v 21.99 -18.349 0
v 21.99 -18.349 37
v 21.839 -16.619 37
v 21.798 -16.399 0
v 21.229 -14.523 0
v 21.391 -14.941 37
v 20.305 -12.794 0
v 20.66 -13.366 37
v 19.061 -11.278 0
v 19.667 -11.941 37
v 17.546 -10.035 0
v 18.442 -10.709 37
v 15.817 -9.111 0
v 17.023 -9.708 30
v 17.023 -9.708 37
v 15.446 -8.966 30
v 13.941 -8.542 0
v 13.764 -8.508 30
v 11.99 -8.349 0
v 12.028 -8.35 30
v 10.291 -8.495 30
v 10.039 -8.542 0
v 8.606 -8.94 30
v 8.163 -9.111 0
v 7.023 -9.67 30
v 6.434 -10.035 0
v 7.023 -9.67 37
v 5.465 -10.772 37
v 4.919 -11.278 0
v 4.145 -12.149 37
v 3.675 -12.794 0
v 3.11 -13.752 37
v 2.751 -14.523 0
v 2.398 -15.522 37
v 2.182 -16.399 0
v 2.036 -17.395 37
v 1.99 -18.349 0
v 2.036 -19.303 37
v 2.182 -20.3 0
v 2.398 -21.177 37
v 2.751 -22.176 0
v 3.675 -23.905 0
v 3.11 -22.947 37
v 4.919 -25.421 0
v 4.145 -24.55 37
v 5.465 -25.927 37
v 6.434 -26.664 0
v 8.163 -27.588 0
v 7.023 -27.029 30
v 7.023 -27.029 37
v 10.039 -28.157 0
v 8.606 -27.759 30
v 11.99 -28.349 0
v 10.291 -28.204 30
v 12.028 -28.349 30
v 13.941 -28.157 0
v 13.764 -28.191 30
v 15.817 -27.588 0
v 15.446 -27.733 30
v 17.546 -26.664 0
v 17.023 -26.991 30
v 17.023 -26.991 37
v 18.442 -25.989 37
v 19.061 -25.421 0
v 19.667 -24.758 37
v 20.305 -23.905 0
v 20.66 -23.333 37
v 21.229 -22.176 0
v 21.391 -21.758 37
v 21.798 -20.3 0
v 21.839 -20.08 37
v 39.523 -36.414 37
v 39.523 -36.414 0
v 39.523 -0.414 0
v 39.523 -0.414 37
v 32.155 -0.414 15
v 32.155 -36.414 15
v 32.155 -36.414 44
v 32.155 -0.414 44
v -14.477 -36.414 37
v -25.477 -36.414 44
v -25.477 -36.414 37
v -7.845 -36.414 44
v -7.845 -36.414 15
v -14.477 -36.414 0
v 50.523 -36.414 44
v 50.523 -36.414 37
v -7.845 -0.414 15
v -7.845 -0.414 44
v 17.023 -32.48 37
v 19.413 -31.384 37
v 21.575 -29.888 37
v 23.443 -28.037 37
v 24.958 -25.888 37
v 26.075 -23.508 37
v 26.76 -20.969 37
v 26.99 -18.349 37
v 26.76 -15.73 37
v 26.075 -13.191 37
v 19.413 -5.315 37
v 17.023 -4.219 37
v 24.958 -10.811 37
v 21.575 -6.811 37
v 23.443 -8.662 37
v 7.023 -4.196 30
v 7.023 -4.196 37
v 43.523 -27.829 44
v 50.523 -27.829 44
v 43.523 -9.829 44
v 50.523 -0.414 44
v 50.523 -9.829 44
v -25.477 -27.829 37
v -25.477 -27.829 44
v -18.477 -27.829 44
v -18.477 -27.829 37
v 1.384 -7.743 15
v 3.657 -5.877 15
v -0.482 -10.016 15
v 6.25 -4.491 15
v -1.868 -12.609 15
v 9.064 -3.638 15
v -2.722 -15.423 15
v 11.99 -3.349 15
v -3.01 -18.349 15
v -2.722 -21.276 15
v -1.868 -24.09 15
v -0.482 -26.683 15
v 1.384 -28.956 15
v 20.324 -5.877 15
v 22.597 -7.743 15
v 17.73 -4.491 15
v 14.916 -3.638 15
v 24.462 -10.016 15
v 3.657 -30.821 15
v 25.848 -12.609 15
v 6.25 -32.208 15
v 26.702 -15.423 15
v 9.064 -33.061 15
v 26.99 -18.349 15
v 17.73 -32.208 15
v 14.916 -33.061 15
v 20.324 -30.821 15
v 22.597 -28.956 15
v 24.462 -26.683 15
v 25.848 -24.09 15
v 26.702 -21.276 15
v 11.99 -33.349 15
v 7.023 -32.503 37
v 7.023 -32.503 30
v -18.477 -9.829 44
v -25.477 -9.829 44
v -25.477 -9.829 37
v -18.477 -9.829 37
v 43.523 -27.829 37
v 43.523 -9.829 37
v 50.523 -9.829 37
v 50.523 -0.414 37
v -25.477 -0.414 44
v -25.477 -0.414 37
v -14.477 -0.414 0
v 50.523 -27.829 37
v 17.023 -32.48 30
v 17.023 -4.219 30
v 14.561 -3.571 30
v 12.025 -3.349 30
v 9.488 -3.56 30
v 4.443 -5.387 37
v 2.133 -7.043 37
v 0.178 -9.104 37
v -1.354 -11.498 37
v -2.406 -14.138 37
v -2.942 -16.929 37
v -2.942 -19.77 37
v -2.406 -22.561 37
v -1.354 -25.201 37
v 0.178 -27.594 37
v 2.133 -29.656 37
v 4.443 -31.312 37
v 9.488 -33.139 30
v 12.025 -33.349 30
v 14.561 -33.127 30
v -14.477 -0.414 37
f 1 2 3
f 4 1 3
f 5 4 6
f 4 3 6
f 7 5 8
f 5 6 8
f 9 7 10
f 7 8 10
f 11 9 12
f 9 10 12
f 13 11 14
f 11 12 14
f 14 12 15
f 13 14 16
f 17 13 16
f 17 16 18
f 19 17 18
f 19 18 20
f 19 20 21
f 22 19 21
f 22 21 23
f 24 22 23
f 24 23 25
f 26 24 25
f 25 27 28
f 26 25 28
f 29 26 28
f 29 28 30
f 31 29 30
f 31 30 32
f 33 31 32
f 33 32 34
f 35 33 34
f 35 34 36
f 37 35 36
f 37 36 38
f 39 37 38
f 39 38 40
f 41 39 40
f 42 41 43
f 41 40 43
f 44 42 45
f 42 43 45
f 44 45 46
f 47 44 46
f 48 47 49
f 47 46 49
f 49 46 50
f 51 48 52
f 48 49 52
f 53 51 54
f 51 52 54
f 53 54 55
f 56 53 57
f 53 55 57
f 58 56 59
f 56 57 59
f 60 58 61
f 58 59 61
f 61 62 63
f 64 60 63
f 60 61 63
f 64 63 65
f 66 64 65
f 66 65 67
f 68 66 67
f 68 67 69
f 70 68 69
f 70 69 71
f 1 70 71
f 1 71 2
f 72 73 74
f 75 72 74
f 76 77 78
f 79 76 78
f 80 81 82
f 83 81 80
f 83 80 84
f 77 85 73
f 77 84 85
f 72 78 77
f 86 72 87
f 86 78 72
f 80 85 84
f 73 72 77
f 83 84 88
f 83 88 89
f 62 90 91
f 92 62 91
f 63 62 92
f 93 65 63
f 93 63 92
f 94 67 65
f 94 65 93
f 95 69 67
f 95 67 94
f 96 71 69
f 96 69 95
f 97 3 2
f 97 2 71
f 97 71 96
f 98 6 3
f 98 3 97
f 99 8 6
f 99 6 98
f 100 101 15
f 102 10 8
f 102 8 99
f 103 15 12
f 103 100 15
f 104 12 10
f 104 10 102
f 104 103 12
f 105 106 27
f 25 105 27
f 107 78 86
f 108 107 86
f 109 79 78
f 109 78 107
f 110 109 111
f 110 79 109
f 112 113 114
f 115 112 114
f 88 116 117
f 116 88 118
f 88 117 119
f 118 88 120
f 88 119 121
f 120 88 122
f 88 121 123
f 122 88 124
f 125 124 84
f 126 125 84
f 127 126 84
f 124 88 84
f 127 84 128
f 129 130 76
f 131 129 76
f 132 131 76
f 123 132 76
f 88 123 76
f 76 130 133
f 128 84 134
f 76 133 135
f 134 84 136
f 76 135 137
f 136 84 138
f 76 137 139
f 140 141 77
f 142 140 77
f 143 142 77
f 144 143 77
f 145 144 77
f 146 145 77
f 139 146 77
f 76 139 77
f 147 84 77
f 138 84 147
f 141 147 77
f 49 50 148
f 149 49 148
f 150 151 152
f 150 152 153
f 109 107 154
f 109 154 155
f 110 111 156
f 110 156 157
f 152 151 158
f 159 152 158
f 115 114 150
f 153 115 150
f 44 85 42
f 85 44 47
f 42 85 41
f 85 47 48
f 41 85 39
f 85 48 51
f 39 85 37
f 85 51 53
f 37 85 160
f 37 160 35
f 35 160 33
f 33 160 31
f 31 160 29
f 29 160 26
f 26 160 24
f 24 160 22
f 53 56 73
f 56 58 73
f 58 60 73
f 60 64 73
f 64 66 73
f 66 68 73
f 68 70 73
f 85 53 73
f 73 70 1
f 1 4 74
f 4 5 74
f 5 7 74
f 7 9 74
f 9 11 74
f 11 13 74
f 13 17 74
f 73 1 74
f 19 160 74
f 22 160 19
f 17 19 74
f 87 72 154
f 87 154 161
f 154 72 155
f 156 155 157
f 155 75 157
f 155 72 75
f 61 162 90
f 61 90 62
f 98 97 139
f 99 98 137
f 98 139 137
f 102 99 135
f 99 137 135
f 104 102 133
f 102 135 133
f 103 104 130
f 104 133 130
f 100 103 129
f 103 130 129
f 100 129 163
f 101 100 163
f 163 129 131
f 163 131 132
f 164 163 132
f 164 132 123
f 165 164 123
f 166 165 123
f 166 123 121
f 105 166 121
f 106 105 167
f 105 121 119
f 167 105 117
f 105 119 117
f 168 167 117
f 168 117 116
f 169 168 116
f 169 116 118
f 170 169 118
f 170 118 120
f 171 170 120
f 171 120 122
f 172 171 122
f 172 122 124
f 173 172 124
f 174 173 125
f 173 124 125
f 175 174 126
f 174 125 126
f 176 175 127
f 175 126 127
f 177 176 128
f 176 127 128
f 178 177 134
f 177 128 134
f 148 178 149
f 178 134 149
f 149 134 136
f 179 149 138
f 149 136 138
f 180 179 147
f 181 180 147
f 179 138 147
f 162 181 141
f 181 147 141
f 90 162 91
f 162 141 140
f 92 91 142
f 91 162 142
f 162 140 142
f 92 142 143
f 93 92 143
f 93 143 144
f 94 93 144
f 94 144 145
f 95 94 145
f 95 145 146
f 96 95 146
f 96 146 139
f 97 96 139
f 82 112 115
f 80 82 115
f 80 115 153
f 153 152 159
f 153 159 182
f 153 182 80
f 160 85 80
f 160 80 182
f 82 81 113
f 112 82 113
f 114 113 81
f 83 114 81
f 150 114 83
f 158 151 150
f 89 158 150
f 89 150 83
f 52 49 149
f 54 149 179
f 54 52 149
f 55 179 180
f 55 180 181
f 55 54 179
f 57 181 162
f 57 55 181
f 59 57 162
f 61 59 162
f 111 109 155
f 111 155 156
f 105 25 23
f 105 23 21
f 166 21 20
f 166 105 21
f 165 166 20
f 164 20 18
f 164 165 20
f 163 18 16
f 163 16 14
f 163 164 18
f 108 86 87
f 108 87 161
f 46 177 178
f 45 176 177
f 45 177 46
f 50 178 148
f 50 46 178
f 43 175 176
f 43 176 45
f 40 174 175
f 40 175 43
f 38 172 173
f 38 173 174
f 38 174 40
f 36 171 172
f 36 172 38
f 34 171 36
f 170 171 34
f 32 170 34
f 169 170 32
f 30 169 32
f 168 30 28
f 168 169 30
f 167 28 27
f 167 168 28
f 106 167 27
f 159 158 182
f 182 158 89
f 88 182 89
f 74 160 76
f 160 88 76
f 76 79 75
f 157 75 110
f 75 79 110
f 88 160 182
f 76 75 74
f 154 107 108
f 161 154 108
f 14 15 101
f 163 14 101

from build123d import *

# Parameters (mm, degrees)
F0_W      = 54
F0_H      = 36
F1_DEPTH  = 44
F2_W      = 40
F2_H      = 29
F3_DEPTH  = 36
F4_W      = 11
F4_H      = 36
F5_DEPTH  = 7
F6_W      = 7
F6_H      = 18
F7_DEPTH  = 7
F8_W      = 11
F8_H      = 36
F9_DEPTH  = 7
F10_W     = 7
F10_H     = 18
F11_DEPTH = 7
F12_R     = 15
F13_DEPTH = 22
F14_R     = 10
F15_DEPTH = 40
F17_DEPTH = 7


with BuildPart() as f1:
    # F0 (on Top) → F1 (new body)
    with BuildSketch(Plane.XY):
        with Locations((12.5230278373, -18.4144742489)):
            Rectangle(F0_W, F0_H)
    extrude(amount=F1_DEPTH)

    # F2 (on face) → F3 (cut)
    with BuildSketch(Plane.XZ.offset(36.4144742489)):
        with Locations((12.1546047553, 29.5)):
            Rectangle(F2_W, F2_H)
    extrude(amount=-F3_DEPTH, mode=Mode.SUBTRACT)

    # F4 (on face) → F5 (join)
    with BuildSketch(Plane.XY.offset(44)):
        with Locations((45.0230278373, -18.4144742489)):
            Rectangle(F4_W, F4_H)
    extrude(amount=-F5_DEPTH)

    # F6 (on face) → F7 (cut)
    with BuildSketch(Plane.XY.offset(44)):
        with Locations((47.0230278373, -18.8289485723)):
            Rectangle(F6_W, F6_H)
    extrude(amount=-F7_DEPTH, mode=Mode.SUBTRACT)

    # F8 (on face) → F9 (join)
    with BuildSketch(Plane.XY.offset(44)):
        with Locations((-19.9769721627, -18.4144742489)):
            Rectangle(F8_W, F8_H)
    extrude(amount=-F9_DEPTH)

    # F10 (on face) → F11 (cut)
    with BuildSketch(Plane.XY.offset(44)):
        with Locations((-21.9769721627, -18.8289485723)):
            Rectangle(F10_W, F10_H)
    extrude(amount=-F11_DEPTH, mode=Mode.SUBTRACT)

    # F12 (on face) → F13 (join)
    with BuildSketch(Plane.XY.offset(15)):
        with Locations((11.9901327416, -18.3494538069)):
            Circle(F12_R)
    extrude(amount=F13_DEPTH)

    # F14 (on face) → F15 (cut)
    with BuildSketch(Plane.XY.offset(37)):
        with Locations((11.9901327416, -18.3494538069)):
            Circle(F14_R)
    extrude(amount=-F15_DEPTH, mode=Mode.SUBTRACT)

    # F16 (on face) → F17 (cut)
    with BuildSketch(Plane.XY.offset(37)):
        with BuildLine():
            ThreePointArc((17.0230269432, -4.2189911126), (12.0250223229, -3.349494383), (7.0230269432, -4.1957313288))
            Line((7.0230269432, -4.1957313288), (7.0230269432, -9.6702914056))
            ThreePointArc((7.0230269432, -9.6702914056), (12.0281157852, -8.3495259427), (17.0230269432, -9.7082747232))
            Line((17.0230269432, -9.7082747232), (17.0230269432, -4.2189911126))
        make_face()
        with BuildLine():
            Line((7.0230269432, -27.0286162081), (7.0230269432, -32.503176285))
            ThreePointArc((7.0230269432, -32.503176285), (12.0250223229, -33.3494132307), (17.0230269432, -32.4799165012))
            Line((17.0230269432, -32.4799165012), (17.0230269432, -26.9906328905))
            ThreePointArc((17.0230269432, -26.9906328905), (12.0281157852, -28.349381671), (7.0230269432, -27.0286162081))
        make_face()
    extrude(amount=-F17_DEPTH, mode=Mode.SUBTRACT)


solid = f1.part
